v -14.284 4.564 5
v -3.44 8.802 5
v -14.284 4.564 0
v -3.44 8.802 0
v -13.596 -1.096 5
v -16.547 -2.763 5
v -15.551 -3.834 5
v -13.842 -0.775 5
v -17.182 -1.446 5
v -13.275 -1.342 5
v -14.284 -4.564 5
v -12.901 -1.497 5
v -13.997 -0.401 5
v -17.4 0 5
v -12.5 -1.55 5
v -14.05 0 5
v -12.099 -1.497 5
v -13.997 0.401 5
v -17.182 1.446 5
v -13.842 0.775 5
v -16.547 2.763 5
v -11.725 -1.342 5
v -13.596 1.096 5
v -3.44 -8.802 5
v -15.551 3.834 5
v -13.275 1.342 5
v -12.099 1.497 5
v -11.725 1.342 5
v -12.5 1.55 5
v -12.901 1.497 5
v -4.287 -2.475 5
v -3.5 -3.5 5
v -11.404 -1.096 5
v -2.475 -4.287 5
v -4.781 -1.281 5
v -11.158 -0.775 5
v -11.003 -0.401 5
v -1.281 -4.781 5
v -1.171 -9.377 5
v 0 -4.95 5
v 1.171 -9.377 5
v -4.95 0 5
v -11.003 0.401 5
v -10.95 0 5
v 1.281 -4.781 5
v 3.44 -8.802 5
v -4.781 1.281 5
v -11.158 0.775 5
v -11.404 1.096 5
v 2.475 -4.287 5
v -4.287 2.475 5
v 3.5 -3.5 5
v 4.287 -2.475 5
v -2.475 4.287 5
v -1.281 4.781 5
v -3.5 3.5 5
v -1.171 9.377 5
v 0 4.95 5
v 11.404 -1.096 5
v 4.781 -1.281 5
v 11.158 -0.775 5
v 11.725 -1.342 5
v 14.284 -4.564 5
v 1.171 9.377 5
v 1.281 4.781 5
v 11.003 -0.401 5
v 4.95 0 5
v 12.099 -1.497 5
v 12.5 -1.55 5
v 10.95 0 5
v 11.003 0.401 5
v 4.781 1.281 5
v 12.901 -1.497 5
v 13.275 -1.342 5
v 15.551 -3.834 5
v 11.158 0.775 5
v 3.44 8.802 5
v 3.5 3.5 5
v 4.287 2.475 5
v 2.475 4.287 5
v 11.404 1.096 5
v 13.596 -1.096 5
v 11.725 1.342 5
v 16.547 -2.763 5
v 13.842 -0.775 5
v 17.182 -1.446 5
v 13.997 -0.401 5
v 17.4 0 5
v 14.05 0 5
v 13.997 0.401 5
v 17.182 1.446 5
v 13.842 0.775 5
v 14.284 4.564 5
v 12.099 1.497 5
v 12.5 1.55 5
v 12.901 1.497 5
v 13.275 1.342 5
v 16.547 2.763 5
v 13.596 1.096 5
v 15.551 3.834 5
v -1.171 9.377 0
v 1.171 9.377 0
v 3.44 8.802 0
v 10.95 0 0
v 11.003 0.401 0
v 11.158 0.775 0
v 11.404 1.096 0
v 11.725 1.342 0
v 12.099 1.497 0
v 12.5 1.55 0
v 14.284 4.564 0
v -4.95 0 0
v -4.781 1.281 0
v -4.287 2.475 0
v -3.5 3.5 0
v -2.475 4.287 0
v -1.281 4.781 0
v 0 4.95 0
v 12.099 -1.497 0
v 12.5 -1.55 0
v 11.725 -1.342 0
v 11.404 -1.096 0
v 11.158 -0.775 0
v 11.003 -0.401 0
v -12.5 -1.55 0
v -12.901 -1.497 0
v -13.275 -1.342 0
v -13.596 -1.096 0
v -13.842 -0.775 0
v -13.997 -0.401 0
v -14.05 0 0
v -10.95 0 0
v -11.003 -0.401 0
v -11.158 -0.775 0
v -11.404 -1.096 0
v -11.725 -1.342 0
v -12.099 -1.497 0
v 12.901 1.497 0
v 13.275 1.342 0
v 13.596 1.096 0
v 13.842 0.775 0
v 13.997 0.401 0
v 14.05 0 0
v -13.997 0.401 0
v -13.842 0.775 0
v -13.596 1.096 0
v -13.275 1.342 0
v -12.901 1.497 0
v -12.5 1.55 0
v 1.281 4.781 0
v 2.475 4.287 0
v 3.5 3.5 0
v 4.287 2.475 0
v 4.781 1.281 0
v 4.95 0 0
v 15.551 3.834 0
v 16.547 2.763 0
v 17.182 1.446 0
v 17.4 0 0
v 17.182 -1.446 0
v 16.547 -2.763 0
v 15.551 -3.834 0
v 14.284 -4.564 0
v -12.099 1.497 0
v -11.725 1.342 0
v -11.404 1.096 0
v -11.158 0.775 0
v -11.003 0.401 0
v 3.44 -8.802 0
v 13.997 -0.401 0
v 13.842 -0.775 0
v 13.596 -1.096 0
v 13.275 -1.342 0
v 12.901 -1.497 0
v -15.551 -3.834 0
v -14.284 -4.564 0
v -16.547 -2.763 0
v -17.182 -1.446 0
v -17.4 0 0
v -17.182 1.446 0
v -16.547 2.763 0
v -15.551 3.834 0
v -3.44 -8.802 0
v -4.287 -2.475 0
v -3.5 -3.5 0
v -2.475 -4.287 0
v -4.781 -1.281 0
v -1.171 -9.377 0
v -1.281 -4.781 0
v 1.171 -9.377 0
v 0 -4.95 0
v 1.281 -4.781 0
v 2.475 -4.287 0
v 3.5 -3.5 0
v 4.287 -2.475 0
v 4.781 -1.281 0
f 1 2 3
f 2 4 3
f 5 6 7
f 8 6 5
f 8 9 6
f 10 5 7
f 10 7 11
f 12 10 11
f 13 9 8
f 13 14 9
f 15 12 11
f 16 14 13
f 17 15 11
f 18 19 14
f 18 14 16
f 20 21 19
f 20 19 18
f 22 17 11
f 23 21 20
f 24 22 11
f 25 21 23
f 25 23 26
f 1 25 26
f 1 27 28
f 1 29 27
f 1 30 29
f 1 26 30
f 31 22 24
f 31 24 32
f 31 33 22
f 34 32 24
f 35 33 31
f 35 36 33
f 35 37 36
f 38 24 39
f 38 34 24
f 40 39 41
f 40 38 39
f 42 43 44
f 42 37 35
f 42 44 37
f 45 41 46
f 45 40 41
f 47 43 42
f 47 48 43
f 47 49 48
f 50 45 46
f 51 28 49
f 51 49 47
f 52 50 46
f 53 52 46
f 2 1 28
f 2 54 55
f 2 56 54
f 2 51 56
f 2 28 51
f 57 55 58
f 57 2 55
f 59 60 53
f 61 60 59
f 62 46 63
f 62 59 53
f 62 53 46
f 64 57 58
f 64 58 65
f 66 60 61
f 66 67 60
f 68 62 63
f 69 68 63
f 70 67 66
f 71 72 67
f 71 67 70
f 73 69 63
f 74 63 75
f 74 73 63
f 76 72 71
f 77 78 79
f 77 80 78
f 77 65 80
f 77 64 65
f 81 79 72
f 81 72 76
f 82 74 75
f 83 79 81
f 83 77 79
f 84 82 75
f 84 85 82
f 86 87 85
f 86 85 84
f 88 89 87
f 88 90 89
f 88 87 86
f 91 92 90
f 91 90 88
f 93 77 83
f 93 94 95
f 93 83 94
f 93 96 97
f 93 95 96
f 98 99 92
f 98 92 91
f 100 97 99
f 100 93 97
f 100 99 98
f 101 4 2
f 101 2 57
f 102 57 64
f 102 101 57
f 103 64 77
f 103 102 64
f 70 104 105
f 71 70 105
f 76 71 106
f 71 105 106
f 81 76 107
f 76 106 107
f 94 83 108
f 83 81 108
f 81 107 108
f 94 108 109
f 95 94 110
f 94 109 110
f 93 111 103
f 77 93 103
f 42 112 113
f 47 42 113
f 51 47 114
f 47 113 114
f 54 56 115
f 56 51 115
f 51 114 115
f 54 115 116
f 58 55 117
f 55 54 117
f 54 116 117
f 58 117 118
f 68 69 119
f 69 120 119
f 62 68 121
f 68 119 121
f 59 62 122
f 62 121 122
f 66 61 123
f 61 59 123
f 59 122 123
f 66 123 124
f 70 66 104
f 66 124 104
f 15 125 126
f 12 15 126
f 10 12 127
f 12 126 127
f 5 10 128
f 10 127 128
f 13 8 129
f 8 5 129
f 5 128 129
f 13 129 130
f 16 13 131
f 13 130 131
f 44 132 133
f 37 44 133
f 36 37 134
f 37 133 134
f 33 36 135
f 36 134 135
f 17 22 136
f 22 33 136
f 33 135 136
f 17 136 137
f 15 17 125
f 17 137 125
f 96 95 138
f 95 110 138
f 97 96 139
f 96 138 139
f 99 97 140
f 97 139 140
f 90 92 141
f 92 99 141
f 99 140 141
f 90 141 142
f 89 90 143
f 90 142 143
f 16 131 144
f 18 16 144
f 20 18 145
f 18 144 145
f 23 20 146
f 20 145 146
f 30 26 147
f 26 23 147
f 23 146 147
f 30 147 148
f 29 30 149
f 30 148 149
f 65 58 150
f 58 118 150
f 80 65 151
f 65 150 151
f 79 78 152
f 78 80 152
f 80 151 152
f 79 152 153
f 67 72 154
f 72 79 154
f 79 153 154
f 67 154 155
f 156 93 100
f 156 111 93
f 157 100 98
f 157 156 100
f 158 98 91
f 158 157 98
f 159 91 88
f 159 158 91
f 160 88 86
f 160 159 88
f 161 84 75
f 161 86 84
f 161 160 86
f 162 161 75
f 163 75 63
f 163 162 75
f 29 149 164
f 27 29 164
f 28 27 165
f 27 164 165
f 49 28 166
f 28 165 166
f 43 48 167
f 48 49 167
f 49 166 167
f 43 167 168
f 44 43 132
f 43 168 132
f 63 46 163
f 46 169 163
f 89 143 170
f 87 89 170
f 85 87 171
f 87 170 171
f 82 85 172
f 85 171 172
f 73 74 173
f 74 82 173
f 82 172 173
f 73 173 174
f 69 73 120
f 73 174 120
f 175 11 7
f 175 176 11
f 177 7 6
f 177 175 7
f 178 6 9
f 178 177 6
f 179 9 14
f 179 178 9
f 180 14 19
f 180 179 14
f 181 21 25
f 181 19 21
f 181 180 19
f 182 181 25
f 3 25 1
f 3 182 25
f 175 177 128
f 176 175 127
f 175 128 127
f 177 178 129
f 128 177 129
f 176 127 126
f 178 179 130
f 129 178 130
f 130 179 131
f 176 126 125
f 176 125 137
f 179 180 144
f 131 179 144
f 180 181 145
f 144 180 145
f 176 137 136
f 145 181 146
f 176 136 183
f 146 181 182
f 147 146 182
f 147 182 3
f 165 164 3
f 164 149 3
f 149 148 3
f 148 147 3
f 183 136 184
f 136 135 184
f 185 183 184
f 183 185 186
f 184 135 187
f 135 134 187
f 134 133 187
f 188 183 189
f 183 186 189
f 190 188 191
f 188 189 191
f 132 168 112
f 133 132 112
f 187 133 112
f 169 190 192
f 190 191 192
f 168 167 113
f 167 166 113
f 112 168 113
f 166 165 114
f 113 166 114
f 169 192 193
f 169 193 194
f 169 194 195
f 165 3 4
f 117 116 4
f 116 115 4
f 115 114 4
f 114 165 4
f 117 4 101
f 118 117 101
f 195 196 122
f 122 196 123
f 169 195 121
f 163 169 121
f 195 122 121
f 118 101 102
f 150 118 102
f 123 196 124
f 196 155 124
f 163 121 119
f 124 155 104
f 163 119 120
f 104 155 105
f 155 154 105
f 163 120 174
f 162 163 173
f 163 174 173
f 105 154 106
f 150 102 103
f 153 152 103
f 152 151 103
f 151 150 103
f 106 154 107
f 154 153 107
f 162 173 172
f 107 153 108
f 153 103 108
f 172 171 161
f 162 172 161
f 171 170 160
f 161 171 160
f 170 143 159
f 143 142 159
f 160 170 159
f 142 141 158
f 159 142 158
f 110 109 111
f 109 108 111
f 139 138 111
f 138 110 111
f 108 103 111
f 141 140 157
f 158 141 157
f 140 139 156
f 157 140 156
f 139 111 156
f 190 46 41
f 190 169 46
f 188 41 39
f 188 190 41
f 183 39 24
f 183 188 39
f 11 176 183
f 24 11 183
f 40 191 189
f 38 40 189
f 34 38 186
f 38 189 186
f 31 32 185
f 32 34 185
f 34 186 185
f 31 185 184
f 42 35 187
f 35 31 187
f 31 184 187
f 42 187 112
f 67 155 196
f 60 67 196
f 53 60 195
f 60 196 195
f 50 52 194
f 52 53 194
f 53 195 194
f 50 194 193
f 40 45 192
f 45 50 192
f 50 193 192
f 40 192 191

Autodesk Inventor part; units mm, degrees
ref_plane "YZ Plane" through (0, 0, 0) normal (1, 0, 0) x (0, 1, 0)
ref_plane "XZ Plane" through (0, 0, 0) normal (0, 1, 0) x (-1, 0, 0)
ref_plane "XY Plane" through (0, 0, 0) normal (0, 0, 1) x (1, 0, 0)
sketch "Boceto1" plane through (0, 0, 0) normal (0, 0, 1) x (1, 0, 0)
  arc A0 (12.5, 1.55) -> (10.95, 0) centre (12.5, 0) ccw
  arc A1 (10.95, 0) -> (12.5, -1.55) centre (12.5, 0) ccw
  arc A2 (12.5, -1.55) -> (14.05, 0) centre (12.5, 0) ccw
  arc A3 (14.05, 0) -> (12.5, 1.55) centre (12.5, 0) ccw
  arc A4 (0, 4.95) -> (-4.95, 0) centre (0, 0) ccw
  arc A5 (-4.95, 0) -> (0, -4.95) centre (0, 0) ccw
  arc A6 (0, -4.95) -> (4.95, 0) centre (0, 0) ccw
  arc A7 (4.95, 0) -> (0, 4.95) centre (0, 0) ccw
  arc A8 (-12.5, 1.55) -> (-14.05, 0) centre (-12.5, 0) ccw
  arc A9 (-14.05, 0) -> (-12.5, -1.55) centre (-12.5, 0) ccw
  arc A10 (-12.5, -1.55) -> (-10.95, 0) centre (-12.5, 0) ccw
  arc A11 (-10.95, 0) -> (-12.5, 1.55) centre (-12.5, 0) ccw
  arc A12 (3.4398, 8.8017) -> (-3.4398, 8.8017) centre (0, 0) ccw
  line L0 (-3.4398, 8.8017) -> (-14.2836, 4.5639)
  arc A13 (-14.2836, 4.5639) -> (-14.2836, -4.5639) centre (-12.5, 0) ccw
  line L1 (-14.2836, -4.5639) -> (-3.4398, -8.8017)
  arc A14 (-3.4398, -8.8017) -> (3.4398, -8.8017) centre (0, 0) ccw
  line L2 (3.4398, -8.8017) -> (14.2836, -4.5639)
  arc A15 (14.2836, -4.5639) -> (14.2836, 4.5639) centre (12.5, 0) ccw
  line L3 (14.2836, 4.5639) -> (3.4398, 8.8017)
  point P0 (0, 0)
extrude "Extrusión1" add sketch "Boceto1" along normal blind 5
properties part number "fixador barra"
